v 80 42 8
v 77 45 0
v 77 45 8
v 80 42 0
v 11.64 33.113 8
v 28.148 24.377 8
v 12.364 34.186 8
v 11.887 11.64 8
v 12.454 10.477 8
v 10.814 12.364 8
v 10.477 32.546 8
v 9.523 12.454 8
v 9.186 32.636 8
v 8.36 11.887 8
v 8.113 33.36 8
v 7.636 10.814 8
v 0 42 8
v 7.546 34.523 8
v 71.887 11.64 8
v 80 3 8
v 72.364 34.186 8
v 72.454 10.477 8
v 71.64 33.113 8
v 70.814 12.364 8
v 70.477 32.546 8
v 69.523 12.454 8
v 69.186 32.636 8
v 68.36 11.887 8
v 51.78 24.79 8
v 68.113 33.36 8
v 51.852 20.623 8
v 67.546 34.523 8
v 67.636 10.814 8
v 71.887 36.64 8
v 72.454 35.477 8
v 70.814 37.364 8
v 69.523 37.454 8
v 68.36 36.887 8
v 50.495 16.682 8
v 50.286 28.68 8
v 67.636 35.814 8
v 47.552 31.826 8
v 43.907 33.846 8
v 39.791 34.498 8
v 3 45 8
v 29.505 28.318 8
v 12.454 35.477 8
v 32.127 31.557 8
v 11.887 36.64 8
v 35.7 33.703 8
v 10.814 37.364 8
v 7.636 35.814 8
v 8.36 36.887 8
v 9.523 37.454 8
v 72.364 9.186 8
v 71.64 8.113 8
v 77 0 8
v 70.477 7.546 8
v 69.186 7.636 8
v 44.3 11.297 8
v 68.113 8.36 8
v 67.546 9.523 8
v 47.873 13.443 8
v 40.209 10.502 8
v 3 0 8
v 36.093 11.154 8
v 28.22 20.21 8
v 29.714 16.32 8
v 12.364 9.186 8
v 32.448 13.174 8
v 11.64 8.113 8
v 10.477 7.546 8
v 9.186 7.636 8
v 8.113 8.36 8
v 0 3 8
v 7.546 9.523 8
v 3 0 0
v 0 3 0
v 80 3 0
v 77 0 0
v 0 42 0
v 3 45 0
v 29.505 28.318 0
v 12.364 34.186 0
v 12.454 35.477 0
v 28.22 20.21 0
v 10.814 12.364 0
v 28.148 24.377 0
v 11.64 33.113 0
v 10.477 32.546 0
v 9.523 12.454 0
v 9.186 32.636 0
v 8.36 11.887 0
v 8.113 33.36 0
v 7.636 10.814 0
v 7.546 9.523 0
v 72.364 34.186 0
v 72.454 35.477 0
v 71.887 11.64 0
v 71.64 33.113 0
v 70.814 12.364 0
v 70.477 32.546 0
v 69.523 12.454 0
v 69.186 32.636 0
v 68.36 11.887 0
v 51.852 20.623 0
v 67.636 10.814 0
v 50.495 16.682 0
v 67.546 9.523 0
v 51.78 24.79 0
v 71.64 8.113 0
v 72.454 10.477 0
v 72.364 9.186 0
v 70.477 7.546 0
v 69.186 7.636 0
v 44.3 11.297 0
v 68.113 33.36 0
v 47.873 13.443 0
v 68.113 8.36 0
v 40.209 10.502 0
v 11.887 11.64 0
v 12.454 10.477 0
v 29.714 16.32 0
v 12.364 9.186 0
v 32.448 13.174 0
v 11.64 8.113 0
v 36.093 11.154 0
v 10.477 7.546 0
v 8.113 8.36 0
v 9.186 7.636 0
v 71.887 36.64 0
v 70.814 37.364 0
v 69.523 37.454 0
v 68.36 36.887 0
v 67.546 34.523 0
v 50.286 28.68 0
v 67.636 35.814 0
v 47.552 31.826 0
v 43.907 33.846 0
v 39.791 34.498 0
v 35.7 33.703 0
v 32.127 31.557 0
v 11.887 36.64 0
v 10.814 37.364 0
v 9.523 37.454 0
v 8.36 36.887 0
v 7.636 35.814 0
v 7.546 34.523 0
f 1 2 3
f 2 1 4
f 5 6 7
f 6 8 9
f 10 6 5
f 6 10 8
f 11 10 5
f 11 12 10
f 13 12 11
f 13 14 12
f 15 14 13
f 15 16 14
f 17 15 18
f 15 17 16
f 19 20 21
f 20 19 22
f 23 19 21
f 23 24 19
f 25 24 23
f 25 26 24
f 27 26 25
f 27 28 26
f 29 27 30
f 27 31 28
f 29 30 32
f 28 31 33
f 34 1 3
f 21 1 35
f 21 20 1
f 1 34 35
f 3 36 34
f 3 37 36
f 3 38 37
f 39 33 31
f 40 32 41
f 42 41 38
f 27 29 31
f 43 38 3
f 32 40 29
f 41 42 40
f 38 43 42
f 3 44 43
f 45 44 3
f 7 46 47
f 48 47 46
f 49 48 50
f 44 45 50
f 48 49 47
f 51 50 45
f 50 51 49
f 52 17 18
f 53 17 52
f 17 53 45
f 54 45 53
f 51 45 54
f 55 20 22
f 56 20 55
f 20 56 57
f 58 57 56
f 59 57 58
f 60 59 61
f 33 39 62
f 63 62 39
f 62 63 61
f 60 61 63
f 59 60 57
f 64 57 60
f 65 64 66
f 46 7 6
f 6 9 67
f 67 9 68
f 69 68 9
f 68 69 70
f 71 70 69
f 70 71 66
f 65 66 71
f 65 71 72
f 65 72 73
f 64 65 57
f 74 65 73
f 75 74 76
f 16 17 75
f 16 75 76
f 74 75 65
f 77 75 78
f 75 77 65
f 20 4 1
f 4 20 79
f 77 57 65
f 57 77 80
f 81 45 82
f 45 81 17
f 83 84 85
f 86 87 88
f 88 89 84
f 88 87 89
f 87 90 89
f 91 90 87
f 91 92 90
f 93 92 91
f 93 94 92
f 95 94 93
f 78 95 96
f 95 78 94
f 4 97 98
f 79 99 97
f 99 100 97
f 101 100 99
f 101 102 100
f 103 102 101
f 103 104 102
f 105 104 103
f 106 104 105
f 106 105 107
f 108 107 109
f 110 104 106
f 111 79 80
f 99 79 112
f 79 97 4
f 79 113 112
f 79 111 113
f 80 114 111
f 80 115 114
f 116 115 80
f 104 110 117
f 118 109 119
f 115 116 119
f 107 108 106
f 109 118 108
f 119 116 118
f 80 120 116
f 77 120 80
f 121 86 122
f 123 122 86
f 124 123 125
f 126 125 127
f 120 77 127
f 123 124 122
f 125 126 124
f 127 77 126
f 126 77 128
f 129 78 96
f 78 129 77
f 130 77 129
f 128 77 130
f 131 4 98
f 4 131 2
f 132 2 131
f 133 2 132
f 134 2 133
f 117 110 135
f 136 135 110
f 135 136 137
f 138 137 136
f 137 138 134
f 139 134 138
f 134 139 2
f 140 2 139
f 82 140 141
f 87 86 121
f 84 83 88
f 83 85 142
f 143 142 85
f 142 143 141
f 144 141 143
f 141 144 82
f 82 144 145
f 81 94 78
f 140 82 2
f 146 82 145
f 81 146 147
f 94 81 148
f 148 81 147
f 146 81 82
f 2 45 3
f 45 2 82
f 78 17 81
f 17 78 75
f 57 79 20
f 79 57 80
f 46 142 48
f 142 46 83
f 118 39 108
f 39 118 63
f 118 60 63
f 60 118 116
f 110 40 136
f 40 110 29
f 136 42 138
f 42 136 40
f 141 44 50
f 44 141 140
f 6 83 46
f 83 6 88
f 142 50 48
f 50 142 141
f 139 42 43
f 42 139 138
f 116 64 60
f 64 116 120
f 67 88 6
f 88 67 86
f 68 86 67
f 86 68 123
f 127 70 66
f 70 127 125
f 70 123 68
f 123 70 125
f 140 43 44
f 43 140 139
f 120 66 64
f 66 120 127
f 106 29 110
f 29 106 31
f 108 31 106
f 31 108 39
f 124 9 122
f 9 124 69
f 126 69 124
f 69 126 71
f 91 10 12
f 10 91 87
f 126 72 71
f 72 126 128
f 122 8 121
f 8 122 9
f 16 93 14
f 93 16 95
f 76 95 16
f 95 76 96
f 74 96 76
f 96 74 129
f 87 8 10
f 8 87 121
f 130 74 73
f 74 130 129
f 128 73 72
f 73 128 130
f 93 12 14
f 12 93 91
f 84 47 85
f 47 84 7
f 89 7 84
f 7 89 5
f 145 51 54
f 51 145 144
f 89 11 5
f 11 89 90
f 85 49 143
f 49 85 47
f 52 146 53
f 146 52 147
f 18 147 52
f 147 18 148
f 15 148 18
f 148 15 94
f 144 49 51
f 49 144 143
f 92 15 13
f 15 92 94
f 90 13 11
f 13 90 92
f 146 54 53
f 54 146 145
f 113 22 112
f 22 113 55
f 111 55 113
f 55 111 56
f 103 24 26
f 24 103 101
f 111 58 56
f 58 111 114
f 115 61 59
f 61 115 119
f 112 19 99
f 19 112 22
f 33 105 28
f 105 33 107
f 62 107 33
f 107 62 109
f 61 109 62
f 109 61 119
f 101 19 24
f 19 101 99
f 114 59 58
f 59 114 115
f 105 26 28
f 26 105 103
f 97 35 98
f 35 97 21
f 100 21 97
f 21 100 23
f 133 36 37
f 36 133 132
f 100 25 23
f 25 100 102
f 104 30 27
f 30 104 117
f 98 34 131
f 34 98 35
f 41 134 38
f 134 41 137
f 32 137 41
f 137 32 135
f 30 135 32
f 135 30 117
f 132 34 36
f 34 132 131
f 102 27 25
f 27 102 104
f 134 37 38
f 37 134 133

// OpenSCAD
$fn = 32;

// ----------------------------------------------------------------------
// Spacer plate: rect 80 x 45
// ----------------------------------------------------------------------

// --- parameters (mm) ---
bore_r = 12;              // centre bore radius
bolt_r = 2.5;             // bolt hole radius
plate_t = 8;              // plate thickness, Z (extrusion height)
plate_l = 80;             // plate length, X
plate_w = 45;             // plate width, Y
inset = 10;               // corner hole inset

profile = [[3, 0], [77, 0], [80, 3], [80, 42], [77, 45], [3, 45], [0, 42], [0, 3]];  // primary outline, 8 points, counter clockwise
void_1 = [[51.78, 24.79], [50.286, 28.68], [47.552, 31.826], [43.907, 33.846], [39.791, 34.498], [35.7, 33.703], [32.127, 31.557], [29.505, 28.318], [28.148, 24.377], [28.22, 20.21], [29.714, 16.32], [32.448, 13.174], [36.093, 11.154], [40.209, 10.502], [44.3, 11.297], [47.873, 13.443], [50.495, 16.682], [51.852, 20.623]];  // centre bore, 18 points
void_2 = [[12.454, 10.477], [11.887, 11.64], [10.814, 12.364], [9.523, 12.454], [8.36, 11.887], [7.636, 10.814], [7.546, 9.523], [8.113, 8.36], [9.186, 7.636], [10.477, 7.546], [11.64, 8.113], [12.364, 9.186]];  // corner hole, 12 points
void_3 = [[12.454, 35.477], [11.887, 36.64], [10.814, 37.364], [9.523, 37.454], [8.36, 36.887], [7.636, 35.814], [7.546, 34.523], [8.113, 33.36], [9.186, 32.636], [10.477, 32.546], [11.64, 33.113], [12.364, 34.186]];  // corner hole, 12 points
void_4 = [[72.454, 10.477], [71.887, 11.64], [70.814, 12.364], [69.523, 12.454], [68.36, 11.887], [67.636, 10.814], [67.546, 9.523], [68.113, 8.36], [69.186, 7.636], [70.477, 7.546], [71.64, 8.113], [72.364, 9.186]];  // corner hole, 12 points
void_5 = [[72.454, 35.477], [71.887, 36.64], [70.814, 37.364], [69.523, 37.454], [68.36, 36.887], [67.636, 35.814], [67.546, 34.523], [68.113, 33.36], [69.186, 32.636], [70.477, 32.546], [71.64, 33.113], [72.364, 34.186]];  // corner hole, 12 points

// --- the one profile operation ---
difference() {
  linear_extrude(height = plate_t) polygon(points = profile);
  translate([0, 0, -1])
    linear_extrude(height = plate_t + 2) polygon(points = void_1);
  translate([0, 0, -1])
    linear_extrude(height = plate_t + 2) polygon(points = void_2);
  translate([0, 0, -1])
    linear_extrude(height = plate_t + 2) polygon(points = void_3);
  translate([0, 0, -1])
    linear_extrude(height = plate_t + 2) polygon(points = void_4);
  translate([0, 0, -1])
    linear_extrude(height = plate_t + 2) polygon(points = void_5);
}
